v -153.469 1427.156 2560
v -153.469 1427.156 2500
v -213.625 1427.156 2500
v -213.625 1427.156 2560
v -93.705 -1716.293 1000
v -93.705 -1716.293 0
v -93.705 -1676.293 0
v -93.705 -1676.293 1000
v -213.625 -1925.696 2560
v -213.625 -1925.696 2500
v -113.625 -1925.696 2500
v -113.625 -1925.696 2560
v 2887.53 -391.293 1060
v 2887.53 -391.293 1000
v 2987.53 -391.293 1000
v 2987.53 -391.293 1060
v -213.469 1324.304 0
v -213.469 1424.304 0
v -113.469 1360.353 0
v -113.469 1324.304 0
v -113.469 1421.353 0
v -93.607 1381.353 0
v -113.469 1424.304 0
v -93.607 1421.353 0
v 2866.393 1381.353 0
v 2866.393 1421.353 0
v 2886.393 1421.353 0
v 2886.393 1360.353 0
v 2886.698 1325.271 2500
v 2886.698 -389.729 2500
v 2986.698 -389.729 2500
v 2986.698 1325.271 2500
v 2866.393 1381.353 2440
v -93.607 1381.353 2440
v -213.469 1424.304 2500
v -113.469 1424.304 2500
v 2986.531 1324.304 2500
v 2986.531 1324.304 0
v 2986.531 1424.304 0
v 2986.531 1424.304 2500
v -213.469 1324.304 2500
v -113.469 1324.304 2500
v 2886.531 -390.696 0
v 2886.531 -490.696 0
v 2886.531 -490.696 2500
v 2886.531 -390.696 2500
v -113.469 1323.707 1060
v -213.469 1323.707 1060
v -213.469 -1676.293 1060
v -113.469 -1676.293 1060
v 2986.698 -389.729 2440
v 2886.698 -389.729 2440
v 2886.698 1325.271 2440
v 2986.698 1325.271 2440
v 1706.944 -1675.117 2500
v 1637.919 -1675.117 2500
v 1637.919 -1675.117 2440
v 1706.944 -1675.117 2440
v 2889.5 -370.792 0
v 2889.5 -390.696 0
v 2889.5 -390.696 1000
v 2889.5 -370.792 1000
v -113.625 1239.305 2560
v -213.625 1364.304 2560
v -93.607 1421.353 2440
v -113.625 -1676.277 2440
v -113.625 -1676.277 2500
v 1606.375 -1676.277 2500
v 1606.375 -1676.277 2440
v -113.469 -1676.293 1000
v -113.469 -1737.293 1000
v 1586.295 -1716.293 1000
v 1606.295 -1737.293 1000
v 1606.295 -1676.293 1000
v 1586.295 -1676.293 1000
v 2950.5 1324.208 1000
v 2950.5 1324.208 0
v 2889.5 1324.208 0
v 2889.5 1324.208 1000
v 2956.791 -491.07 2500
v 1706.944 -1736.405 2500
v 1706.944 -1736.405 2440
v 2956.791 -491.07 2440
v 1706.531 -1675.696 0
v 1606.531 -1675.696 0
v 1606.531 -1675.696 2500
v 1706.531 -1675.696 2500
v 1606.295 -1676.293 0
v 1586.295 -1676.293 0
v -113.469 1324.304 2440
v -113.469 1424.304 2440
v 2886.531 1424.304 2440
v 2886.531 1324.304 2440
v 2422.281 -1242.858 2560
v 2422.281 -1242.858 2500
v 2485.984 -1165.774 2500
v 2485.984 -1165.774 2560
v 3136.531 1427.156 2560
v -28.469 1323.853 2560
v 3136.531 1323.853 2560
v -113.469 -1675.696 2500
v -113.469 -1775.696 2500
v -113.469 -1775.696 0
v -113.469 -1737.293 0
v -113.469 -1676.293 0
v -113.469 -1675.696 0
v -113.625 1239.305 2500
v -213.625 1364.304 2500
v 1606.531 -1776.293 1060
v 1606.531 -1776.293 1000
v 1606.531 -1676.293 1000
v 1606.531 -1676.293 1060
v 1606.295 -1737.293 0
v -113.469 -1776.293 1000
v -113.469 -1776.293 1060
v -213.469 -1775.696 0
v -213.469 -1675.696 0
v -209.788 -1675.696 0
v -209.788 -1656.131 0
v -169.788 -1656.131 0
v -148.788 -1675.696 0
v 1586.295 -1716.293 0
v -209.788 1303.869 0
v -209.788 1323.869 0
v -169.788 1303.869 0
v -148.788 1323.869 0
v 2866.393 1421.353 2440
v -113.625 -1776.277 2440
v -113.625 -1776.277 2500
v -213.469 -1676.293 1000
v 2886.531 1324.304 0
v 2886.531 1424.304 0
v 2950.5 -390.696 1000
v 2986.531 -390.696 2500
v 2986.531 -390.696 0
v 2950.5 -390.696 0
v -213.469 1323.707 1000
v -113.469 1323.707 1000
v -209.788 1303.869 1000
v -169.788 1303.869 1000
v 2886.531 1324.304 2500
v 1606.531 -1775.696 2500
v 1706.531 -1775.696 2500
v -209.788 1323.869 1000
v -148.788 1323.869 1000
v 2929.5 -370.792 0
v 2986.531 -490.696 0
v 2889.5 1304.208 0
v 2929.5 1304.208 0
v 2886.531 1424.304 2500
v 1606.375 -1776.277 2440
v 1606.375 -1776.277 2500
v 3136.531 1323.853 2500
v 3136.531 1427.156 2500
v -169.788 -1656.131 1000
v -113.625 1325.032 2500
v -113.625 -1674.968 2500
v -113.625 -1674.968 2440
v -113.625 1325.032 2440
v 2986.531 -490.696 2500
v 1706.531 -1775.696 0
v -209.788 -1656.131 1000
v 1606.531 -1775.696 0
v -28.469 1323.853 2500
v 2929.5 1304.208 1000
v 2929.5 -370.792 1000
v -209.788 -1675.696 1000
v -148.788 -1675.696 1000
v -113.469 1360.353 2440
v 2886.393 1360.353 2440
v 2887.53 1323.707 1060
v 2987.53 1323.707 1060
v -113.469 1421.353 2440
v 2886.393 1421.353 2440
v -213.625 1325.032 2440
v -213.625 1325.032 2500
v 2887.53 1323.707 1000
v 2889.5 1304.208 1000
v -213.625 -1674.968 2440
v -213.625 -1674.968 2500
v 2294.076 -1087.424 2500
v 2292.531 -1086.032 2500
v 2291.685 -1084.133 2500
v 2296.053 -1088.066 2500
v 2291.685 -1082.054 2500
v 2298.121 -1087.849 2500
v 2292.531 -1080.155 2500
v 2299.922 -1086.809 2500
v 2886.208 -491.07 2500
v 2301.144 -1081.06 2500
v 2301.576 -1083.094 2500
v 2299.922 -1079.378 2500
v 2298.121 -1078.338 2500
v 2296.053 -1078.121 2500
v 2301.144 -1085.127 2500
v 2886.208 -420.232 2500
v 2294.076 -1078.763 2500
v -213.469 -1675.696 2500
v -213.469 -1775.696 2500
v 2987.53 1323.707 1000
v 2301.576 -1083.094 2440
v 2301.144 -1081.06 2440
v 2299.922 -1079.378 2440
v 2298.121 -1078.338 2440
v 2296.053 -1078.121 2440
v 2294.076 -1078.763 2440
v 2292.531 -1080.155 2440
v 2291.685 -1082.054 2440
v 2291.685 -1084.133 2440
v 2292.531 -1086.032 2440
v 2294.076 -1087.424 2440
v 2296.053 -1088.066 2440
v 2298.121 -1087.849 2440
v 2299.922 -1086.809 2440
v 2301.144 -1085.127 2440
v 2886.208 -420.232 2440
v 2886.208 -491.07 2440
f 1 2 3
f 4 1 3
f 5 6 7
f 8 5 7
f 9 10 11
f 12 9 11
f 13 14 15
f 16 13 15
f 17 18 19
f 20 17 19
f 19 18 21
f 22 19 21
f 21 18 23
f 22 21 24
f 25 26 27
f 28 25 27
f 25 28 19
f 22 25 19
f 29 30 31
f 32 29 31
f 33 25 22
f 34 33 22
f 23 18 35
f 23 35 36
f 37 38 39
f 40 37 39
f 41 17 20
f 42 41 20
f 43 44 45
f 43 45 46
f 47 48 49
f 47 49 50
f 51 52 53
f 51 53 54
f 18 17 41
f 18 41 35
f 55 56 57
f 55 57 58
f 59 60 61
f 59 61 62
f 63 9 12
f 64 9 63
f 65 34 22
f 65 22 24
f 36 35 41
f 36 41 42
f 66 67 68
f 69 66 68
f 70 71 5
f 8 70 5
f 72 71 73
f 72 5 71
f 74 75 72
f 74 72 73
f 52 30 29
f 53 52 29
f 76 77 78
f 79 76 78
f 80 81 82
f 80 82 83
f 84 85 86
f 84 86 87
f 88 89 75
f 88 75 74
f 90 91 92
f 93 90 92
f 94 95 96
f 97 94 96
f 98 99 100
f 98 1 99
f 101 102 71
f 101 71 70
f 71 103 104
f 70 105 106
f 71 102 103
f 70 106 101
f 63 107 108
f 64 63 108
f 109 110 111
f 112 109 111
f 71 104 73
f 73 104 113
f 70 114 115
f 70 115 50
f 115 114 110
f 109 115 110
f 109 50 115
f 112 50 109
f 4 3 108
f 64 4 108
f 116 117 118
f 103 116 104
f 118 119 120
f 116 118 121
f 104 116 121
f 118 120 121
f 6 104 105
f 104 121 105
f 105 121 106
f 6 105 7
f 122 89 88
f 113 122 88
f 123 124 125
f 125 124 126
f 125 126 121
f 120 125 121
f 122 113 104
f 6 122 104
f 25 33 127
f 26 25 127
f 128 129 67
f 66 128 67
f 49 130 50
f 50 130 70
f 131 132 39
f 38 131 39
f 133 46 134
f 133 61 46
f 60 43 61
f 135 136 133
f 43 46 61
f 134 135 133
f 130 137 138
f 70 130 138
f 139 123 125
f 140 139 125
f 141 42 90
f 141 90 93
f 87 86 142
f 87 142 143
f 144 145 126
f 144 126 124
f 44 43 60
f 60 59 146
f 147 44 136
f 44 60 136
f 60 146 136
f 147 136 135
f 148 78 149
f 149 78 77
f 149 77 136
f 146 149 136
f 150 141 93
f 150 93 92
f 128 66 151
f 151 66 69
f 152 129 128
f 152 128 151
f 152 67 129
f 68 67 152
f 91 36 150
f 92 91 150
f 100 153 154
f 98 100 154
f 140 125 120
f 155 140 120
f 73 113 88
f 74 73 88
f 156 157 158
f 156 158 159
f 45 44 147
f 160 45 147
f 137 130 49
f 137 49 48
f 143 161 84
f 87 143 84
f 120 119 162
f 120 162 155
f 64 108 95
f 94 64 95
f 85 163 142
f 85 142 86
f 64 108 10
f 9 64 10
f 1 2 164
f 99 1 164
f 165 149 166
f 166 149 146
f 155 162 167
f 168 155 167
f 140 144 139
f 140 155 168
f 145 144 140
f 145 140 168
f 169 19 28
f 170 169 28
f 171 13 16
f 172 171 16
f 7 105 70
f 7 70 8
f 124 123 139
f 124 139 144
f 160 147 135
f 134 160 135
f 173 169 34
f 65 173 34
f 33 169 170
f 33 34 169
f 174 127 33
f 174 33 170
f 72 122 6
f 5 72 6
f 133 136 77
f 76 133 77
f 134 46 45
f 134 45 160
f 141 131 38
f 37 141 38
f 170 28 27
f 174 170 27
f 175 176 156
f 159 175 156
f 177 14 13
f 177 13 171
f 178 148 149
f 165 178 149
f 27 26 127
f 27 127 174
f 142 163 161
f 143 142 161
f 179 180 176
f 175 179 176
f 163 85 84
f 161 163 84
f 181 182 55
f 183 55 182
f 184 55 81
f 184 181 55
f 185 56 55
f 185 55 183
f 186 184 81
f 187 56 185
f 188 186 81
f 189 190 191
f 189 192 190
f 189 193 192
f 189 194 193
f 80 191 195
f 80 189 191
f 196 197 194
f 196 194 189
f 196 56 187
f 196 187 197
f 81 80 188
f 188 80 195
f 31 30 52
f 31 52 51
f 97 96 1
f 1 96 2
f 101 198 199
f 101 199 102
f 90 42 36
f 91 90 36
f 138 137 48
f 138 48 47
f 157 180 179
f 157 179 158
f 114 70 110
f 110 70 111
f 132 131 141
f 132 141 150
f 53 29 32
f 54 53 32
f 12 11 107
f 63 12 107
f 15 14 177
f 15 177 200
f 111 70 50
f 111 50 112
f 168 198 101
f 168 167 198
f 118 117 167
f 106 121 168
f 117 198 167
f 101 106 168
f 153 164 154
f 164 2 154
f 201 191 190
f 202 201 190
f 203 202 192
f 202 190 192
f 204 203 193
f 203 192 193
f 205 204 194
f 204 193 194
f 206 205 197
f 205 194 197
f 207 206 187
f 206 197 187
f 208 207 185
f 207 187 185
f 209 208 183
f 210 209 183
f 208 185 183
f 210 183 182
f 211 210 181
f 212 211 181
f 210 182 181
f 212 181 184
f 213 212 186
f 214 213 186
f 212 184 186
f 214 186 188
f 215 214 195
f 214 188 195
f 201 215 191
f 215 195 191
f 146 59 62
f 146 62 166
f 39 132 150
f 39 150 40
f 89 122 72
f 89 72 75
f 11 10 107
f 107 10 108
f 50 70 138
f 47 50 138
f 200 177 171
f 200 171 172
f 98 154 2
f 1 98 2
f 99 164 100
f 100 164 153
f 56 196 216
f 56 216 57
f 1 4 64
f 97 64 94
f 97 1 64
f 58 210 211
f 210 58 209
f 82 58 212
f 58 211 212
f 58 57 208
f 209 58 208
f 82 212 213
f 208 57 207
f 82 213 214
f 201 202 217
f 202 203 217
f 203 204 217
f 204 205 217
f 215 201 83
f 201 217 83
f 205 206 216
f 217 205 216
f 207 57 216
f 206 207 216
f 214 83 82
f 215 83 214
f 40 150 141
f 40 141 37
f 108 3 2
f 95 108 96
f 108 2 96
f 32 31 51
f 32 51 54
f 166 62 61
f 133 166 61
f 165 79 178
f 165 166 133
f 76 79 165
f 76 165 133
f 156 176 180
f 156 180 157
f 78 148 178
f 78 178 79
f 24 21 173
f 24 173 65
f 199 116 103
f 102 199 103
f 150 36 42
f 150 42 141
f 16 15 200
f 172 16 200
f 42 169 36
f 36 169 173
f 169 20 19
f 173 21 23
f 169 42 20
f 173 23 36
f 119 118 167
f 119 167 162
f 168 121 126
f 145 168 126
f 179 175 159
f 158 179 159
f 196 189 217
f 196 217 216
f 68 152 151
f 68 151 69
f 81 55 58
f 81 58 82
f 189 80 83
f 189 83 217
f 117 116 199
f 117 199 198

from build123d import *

# Parameters (mm, degrees)
F0_W      = 100
F0_H      = 100
F1_DEPTH  = 2500
F2_W      = 20
F2_H      = 40
F3_DEPTH  = 2440
F4_W      = 40
F4_H      = 20
F5_DEPTH  = 1000
F6_W      = 20
F6_H      = 40
F7_DEPTH  = 1000
F8_W      = 40
F8_H      = 20
F9_DEPTH  = 1000
F10_W     = 3000
F10_H     = 100
F10_W_2   = 100
F10_H_2   = 3000
F10_W_3   = 1720
F10_H_3   = 1715
F11_DEPTH = 60
F12_W     = 1720
F12_H     = 100
F12_W_2   = 100
F12_H_2   = 3000
F12_H_3   = 1715
F13_DEPTH = 60
F15_R     = 5
F16_DEPTH = 2500.001
F17_DEPTH = 60


with BuildPart() as f1:
    # F0 (on Top) → F1 (new body)
    with BuildSketch(Plane.XY):
        with Locations((-163.469012, 1374.304438)):
            Rectangle(F0_W, F0_H)
        with Locations((2936.530988, 1374.304438)):
            Rectangle(F0_W, F0_H)
        with Locations((-163.469012, -1725.695562)):
            Rectangle(F0_W, F0_H)
        with Locations((1656.530988, -1725.695562)):
            Rectangle(F0_W, F0_H)
        with Locations((2936.530988, -440.695562)):
            Rectangle(F0_W, F0_H)
    extrude(amount=F1_DEPTH)

    # F2 (on Top) → F3 (join)
    with BuildSketch(Plane.XY):
        with Locations((-103.607459, 1401.353112)):
            Rectangle(F2_W, F2_H)
        Polygon((-93.607459, 1381.353112), (-113.607459, 1381.353112), (-113.607459, 1360.353112), (2886.392541, 1360.353112), (2886.392541, 1381.353112), (2866.392541, 1381.353112), align=None)
        with Locations((2876.392541, 1401.353112)):
            Rectangle(F2_W, F2_H)
    extrude(amount=F3_DEPTH)

    # F4 (on Top) → F5 (join)
    with BuildSketch(Plane.XY):
        with Locations((-189.787511, 1313.869367)):
            Rectangle(F4_W, F4_H)
        Polygon((-148.787511, 1323.869367), (-169.787511, 1323.869367), (-169.787511, 1303.869367), (-169.787511, -1656.130633), (-169.787511, -1676.130633), (-148.787511, -1676.130633), align=None)
        with Locations((-189.787511, -1666.130633)):
            Rectangle(F4_W, F4_H)
    extrude(amount=F5_DEPTH)

    # F6 (on Top) → F7 (join)
    with BuildSketch(Plane.XY):
        with Locations((-103.705185, -1696.292767)):
            Rectangle(F6_W, F6_H)
        Polygon((-93.705185, -1716.292767), (-113.705185, -1716.292767), (-113.705185, -1737.292767), (1606.294815, -1737.292767), (1606.294815, -1716.292767), (1586.294815, -1716.292767), align=None)
        with Locations((1596.294815, -1696.292767)):
            Rectangle(F6_W, F6_H)
    extrude(amount=F7_DEPTH)

    # F8 (on Top) → F9 (join)
    with BuildSketch(Plane.XY):
        with Locations((2909.500341, 1314.207683)):
            Rectangle(F8_W, F8_H)
        Polygon((2950.500341, 1324.207683), (2929.500341, 1324.207683), (2929.500341, 1304.207683), (2929.500341, -370.792317), (2929.500341, -390.792317), (2950.500341, -390.792317), align=None)
        with Locations((2909.500341, -380.792317)):
            Rectangle(F8_W, F8_H)
    extrude(amount=F9_DEPTH)


with BuildPart() as f11:
    # F10 (on face) → F11 (new body)
    with BuildSketch(Plane.XY.offset(2500)):
        with Locations((1386.530988, 1374.304438)):
            Rectangle(F10_W, F10_H)
        with Locations((-163.624775, -174.968004)):
            Rectangle(F10_W_2, F10_H_2)
        with Locations((746.375225, -1726.276588)):
            Rectangle(F10_W_3, F10_H)
        with Locations((2936.698484, 467.771186)):
            Rectangle(F10_W_2, F10_H_3)
        Polygon((2886.207819, -420.231929), (1637.918642, -1675.116777), (1706.944147, -1675.116777), (1706.944147, -1736.404612), (2956.790513, -491.07036), (2886.207819, -491.07036), align=None)
    extrude(amount=-F11_DEPTH)

    # F15 (on face) → F16 (cut, through all)
    with BuildSketch(Plane.XY.offset(2500)):
        with Locations((2296.575983, -1083.093569)):
            Circle(F15_R)
    extrude(amount=-F16_DEPTH, mode=Mode.SUBTRACT)


with BuildPart() as f13:
    # F12 (on face) → F13 (new body)
    with BuildSketch(Plane.XY.offset(1000)):
        with Locations((746.530988, -1726.292767)):
            Rectangle(F12_W, F12_H)
        with Locations((-163.469012, -176.292767)):
            Rectangle(F12_W_2, F12_H_2)
        with Locations((2937.529612, 466.207233)):
            Rectangle(F12_W_2, F12_H_3)
    extrude(amount=F13_DEPTH)


with BuildPart() as f17:
    # F14 (on face) → F17 (new body)
    with BuildSketch(Plane.XY.offset(2500)):
        Polygon((-113.624775, 1239.30458), (-213.624775, 1364.304438), (-213.624775, -1925.695562), (-113.624775, -1925.695562), align=None)
        Polygon((3136.530988, 1427.156149), (-153.469012, 1427.156149), (-28.469012, 1323.853359), (3136.530988, 1323.853359), align=None)
        Polygon((-213.624775, 1427.156149), (-213.624775, 1364.304438), (2422.280595, -1242.857575), (2485.984104, -1165.774094), (-153.469012, 1427.156149), align=None)
    extrude(amount=F17_DEPTH)


solid = Compound([f1.part, f11.part, f13.part, f17.part])
